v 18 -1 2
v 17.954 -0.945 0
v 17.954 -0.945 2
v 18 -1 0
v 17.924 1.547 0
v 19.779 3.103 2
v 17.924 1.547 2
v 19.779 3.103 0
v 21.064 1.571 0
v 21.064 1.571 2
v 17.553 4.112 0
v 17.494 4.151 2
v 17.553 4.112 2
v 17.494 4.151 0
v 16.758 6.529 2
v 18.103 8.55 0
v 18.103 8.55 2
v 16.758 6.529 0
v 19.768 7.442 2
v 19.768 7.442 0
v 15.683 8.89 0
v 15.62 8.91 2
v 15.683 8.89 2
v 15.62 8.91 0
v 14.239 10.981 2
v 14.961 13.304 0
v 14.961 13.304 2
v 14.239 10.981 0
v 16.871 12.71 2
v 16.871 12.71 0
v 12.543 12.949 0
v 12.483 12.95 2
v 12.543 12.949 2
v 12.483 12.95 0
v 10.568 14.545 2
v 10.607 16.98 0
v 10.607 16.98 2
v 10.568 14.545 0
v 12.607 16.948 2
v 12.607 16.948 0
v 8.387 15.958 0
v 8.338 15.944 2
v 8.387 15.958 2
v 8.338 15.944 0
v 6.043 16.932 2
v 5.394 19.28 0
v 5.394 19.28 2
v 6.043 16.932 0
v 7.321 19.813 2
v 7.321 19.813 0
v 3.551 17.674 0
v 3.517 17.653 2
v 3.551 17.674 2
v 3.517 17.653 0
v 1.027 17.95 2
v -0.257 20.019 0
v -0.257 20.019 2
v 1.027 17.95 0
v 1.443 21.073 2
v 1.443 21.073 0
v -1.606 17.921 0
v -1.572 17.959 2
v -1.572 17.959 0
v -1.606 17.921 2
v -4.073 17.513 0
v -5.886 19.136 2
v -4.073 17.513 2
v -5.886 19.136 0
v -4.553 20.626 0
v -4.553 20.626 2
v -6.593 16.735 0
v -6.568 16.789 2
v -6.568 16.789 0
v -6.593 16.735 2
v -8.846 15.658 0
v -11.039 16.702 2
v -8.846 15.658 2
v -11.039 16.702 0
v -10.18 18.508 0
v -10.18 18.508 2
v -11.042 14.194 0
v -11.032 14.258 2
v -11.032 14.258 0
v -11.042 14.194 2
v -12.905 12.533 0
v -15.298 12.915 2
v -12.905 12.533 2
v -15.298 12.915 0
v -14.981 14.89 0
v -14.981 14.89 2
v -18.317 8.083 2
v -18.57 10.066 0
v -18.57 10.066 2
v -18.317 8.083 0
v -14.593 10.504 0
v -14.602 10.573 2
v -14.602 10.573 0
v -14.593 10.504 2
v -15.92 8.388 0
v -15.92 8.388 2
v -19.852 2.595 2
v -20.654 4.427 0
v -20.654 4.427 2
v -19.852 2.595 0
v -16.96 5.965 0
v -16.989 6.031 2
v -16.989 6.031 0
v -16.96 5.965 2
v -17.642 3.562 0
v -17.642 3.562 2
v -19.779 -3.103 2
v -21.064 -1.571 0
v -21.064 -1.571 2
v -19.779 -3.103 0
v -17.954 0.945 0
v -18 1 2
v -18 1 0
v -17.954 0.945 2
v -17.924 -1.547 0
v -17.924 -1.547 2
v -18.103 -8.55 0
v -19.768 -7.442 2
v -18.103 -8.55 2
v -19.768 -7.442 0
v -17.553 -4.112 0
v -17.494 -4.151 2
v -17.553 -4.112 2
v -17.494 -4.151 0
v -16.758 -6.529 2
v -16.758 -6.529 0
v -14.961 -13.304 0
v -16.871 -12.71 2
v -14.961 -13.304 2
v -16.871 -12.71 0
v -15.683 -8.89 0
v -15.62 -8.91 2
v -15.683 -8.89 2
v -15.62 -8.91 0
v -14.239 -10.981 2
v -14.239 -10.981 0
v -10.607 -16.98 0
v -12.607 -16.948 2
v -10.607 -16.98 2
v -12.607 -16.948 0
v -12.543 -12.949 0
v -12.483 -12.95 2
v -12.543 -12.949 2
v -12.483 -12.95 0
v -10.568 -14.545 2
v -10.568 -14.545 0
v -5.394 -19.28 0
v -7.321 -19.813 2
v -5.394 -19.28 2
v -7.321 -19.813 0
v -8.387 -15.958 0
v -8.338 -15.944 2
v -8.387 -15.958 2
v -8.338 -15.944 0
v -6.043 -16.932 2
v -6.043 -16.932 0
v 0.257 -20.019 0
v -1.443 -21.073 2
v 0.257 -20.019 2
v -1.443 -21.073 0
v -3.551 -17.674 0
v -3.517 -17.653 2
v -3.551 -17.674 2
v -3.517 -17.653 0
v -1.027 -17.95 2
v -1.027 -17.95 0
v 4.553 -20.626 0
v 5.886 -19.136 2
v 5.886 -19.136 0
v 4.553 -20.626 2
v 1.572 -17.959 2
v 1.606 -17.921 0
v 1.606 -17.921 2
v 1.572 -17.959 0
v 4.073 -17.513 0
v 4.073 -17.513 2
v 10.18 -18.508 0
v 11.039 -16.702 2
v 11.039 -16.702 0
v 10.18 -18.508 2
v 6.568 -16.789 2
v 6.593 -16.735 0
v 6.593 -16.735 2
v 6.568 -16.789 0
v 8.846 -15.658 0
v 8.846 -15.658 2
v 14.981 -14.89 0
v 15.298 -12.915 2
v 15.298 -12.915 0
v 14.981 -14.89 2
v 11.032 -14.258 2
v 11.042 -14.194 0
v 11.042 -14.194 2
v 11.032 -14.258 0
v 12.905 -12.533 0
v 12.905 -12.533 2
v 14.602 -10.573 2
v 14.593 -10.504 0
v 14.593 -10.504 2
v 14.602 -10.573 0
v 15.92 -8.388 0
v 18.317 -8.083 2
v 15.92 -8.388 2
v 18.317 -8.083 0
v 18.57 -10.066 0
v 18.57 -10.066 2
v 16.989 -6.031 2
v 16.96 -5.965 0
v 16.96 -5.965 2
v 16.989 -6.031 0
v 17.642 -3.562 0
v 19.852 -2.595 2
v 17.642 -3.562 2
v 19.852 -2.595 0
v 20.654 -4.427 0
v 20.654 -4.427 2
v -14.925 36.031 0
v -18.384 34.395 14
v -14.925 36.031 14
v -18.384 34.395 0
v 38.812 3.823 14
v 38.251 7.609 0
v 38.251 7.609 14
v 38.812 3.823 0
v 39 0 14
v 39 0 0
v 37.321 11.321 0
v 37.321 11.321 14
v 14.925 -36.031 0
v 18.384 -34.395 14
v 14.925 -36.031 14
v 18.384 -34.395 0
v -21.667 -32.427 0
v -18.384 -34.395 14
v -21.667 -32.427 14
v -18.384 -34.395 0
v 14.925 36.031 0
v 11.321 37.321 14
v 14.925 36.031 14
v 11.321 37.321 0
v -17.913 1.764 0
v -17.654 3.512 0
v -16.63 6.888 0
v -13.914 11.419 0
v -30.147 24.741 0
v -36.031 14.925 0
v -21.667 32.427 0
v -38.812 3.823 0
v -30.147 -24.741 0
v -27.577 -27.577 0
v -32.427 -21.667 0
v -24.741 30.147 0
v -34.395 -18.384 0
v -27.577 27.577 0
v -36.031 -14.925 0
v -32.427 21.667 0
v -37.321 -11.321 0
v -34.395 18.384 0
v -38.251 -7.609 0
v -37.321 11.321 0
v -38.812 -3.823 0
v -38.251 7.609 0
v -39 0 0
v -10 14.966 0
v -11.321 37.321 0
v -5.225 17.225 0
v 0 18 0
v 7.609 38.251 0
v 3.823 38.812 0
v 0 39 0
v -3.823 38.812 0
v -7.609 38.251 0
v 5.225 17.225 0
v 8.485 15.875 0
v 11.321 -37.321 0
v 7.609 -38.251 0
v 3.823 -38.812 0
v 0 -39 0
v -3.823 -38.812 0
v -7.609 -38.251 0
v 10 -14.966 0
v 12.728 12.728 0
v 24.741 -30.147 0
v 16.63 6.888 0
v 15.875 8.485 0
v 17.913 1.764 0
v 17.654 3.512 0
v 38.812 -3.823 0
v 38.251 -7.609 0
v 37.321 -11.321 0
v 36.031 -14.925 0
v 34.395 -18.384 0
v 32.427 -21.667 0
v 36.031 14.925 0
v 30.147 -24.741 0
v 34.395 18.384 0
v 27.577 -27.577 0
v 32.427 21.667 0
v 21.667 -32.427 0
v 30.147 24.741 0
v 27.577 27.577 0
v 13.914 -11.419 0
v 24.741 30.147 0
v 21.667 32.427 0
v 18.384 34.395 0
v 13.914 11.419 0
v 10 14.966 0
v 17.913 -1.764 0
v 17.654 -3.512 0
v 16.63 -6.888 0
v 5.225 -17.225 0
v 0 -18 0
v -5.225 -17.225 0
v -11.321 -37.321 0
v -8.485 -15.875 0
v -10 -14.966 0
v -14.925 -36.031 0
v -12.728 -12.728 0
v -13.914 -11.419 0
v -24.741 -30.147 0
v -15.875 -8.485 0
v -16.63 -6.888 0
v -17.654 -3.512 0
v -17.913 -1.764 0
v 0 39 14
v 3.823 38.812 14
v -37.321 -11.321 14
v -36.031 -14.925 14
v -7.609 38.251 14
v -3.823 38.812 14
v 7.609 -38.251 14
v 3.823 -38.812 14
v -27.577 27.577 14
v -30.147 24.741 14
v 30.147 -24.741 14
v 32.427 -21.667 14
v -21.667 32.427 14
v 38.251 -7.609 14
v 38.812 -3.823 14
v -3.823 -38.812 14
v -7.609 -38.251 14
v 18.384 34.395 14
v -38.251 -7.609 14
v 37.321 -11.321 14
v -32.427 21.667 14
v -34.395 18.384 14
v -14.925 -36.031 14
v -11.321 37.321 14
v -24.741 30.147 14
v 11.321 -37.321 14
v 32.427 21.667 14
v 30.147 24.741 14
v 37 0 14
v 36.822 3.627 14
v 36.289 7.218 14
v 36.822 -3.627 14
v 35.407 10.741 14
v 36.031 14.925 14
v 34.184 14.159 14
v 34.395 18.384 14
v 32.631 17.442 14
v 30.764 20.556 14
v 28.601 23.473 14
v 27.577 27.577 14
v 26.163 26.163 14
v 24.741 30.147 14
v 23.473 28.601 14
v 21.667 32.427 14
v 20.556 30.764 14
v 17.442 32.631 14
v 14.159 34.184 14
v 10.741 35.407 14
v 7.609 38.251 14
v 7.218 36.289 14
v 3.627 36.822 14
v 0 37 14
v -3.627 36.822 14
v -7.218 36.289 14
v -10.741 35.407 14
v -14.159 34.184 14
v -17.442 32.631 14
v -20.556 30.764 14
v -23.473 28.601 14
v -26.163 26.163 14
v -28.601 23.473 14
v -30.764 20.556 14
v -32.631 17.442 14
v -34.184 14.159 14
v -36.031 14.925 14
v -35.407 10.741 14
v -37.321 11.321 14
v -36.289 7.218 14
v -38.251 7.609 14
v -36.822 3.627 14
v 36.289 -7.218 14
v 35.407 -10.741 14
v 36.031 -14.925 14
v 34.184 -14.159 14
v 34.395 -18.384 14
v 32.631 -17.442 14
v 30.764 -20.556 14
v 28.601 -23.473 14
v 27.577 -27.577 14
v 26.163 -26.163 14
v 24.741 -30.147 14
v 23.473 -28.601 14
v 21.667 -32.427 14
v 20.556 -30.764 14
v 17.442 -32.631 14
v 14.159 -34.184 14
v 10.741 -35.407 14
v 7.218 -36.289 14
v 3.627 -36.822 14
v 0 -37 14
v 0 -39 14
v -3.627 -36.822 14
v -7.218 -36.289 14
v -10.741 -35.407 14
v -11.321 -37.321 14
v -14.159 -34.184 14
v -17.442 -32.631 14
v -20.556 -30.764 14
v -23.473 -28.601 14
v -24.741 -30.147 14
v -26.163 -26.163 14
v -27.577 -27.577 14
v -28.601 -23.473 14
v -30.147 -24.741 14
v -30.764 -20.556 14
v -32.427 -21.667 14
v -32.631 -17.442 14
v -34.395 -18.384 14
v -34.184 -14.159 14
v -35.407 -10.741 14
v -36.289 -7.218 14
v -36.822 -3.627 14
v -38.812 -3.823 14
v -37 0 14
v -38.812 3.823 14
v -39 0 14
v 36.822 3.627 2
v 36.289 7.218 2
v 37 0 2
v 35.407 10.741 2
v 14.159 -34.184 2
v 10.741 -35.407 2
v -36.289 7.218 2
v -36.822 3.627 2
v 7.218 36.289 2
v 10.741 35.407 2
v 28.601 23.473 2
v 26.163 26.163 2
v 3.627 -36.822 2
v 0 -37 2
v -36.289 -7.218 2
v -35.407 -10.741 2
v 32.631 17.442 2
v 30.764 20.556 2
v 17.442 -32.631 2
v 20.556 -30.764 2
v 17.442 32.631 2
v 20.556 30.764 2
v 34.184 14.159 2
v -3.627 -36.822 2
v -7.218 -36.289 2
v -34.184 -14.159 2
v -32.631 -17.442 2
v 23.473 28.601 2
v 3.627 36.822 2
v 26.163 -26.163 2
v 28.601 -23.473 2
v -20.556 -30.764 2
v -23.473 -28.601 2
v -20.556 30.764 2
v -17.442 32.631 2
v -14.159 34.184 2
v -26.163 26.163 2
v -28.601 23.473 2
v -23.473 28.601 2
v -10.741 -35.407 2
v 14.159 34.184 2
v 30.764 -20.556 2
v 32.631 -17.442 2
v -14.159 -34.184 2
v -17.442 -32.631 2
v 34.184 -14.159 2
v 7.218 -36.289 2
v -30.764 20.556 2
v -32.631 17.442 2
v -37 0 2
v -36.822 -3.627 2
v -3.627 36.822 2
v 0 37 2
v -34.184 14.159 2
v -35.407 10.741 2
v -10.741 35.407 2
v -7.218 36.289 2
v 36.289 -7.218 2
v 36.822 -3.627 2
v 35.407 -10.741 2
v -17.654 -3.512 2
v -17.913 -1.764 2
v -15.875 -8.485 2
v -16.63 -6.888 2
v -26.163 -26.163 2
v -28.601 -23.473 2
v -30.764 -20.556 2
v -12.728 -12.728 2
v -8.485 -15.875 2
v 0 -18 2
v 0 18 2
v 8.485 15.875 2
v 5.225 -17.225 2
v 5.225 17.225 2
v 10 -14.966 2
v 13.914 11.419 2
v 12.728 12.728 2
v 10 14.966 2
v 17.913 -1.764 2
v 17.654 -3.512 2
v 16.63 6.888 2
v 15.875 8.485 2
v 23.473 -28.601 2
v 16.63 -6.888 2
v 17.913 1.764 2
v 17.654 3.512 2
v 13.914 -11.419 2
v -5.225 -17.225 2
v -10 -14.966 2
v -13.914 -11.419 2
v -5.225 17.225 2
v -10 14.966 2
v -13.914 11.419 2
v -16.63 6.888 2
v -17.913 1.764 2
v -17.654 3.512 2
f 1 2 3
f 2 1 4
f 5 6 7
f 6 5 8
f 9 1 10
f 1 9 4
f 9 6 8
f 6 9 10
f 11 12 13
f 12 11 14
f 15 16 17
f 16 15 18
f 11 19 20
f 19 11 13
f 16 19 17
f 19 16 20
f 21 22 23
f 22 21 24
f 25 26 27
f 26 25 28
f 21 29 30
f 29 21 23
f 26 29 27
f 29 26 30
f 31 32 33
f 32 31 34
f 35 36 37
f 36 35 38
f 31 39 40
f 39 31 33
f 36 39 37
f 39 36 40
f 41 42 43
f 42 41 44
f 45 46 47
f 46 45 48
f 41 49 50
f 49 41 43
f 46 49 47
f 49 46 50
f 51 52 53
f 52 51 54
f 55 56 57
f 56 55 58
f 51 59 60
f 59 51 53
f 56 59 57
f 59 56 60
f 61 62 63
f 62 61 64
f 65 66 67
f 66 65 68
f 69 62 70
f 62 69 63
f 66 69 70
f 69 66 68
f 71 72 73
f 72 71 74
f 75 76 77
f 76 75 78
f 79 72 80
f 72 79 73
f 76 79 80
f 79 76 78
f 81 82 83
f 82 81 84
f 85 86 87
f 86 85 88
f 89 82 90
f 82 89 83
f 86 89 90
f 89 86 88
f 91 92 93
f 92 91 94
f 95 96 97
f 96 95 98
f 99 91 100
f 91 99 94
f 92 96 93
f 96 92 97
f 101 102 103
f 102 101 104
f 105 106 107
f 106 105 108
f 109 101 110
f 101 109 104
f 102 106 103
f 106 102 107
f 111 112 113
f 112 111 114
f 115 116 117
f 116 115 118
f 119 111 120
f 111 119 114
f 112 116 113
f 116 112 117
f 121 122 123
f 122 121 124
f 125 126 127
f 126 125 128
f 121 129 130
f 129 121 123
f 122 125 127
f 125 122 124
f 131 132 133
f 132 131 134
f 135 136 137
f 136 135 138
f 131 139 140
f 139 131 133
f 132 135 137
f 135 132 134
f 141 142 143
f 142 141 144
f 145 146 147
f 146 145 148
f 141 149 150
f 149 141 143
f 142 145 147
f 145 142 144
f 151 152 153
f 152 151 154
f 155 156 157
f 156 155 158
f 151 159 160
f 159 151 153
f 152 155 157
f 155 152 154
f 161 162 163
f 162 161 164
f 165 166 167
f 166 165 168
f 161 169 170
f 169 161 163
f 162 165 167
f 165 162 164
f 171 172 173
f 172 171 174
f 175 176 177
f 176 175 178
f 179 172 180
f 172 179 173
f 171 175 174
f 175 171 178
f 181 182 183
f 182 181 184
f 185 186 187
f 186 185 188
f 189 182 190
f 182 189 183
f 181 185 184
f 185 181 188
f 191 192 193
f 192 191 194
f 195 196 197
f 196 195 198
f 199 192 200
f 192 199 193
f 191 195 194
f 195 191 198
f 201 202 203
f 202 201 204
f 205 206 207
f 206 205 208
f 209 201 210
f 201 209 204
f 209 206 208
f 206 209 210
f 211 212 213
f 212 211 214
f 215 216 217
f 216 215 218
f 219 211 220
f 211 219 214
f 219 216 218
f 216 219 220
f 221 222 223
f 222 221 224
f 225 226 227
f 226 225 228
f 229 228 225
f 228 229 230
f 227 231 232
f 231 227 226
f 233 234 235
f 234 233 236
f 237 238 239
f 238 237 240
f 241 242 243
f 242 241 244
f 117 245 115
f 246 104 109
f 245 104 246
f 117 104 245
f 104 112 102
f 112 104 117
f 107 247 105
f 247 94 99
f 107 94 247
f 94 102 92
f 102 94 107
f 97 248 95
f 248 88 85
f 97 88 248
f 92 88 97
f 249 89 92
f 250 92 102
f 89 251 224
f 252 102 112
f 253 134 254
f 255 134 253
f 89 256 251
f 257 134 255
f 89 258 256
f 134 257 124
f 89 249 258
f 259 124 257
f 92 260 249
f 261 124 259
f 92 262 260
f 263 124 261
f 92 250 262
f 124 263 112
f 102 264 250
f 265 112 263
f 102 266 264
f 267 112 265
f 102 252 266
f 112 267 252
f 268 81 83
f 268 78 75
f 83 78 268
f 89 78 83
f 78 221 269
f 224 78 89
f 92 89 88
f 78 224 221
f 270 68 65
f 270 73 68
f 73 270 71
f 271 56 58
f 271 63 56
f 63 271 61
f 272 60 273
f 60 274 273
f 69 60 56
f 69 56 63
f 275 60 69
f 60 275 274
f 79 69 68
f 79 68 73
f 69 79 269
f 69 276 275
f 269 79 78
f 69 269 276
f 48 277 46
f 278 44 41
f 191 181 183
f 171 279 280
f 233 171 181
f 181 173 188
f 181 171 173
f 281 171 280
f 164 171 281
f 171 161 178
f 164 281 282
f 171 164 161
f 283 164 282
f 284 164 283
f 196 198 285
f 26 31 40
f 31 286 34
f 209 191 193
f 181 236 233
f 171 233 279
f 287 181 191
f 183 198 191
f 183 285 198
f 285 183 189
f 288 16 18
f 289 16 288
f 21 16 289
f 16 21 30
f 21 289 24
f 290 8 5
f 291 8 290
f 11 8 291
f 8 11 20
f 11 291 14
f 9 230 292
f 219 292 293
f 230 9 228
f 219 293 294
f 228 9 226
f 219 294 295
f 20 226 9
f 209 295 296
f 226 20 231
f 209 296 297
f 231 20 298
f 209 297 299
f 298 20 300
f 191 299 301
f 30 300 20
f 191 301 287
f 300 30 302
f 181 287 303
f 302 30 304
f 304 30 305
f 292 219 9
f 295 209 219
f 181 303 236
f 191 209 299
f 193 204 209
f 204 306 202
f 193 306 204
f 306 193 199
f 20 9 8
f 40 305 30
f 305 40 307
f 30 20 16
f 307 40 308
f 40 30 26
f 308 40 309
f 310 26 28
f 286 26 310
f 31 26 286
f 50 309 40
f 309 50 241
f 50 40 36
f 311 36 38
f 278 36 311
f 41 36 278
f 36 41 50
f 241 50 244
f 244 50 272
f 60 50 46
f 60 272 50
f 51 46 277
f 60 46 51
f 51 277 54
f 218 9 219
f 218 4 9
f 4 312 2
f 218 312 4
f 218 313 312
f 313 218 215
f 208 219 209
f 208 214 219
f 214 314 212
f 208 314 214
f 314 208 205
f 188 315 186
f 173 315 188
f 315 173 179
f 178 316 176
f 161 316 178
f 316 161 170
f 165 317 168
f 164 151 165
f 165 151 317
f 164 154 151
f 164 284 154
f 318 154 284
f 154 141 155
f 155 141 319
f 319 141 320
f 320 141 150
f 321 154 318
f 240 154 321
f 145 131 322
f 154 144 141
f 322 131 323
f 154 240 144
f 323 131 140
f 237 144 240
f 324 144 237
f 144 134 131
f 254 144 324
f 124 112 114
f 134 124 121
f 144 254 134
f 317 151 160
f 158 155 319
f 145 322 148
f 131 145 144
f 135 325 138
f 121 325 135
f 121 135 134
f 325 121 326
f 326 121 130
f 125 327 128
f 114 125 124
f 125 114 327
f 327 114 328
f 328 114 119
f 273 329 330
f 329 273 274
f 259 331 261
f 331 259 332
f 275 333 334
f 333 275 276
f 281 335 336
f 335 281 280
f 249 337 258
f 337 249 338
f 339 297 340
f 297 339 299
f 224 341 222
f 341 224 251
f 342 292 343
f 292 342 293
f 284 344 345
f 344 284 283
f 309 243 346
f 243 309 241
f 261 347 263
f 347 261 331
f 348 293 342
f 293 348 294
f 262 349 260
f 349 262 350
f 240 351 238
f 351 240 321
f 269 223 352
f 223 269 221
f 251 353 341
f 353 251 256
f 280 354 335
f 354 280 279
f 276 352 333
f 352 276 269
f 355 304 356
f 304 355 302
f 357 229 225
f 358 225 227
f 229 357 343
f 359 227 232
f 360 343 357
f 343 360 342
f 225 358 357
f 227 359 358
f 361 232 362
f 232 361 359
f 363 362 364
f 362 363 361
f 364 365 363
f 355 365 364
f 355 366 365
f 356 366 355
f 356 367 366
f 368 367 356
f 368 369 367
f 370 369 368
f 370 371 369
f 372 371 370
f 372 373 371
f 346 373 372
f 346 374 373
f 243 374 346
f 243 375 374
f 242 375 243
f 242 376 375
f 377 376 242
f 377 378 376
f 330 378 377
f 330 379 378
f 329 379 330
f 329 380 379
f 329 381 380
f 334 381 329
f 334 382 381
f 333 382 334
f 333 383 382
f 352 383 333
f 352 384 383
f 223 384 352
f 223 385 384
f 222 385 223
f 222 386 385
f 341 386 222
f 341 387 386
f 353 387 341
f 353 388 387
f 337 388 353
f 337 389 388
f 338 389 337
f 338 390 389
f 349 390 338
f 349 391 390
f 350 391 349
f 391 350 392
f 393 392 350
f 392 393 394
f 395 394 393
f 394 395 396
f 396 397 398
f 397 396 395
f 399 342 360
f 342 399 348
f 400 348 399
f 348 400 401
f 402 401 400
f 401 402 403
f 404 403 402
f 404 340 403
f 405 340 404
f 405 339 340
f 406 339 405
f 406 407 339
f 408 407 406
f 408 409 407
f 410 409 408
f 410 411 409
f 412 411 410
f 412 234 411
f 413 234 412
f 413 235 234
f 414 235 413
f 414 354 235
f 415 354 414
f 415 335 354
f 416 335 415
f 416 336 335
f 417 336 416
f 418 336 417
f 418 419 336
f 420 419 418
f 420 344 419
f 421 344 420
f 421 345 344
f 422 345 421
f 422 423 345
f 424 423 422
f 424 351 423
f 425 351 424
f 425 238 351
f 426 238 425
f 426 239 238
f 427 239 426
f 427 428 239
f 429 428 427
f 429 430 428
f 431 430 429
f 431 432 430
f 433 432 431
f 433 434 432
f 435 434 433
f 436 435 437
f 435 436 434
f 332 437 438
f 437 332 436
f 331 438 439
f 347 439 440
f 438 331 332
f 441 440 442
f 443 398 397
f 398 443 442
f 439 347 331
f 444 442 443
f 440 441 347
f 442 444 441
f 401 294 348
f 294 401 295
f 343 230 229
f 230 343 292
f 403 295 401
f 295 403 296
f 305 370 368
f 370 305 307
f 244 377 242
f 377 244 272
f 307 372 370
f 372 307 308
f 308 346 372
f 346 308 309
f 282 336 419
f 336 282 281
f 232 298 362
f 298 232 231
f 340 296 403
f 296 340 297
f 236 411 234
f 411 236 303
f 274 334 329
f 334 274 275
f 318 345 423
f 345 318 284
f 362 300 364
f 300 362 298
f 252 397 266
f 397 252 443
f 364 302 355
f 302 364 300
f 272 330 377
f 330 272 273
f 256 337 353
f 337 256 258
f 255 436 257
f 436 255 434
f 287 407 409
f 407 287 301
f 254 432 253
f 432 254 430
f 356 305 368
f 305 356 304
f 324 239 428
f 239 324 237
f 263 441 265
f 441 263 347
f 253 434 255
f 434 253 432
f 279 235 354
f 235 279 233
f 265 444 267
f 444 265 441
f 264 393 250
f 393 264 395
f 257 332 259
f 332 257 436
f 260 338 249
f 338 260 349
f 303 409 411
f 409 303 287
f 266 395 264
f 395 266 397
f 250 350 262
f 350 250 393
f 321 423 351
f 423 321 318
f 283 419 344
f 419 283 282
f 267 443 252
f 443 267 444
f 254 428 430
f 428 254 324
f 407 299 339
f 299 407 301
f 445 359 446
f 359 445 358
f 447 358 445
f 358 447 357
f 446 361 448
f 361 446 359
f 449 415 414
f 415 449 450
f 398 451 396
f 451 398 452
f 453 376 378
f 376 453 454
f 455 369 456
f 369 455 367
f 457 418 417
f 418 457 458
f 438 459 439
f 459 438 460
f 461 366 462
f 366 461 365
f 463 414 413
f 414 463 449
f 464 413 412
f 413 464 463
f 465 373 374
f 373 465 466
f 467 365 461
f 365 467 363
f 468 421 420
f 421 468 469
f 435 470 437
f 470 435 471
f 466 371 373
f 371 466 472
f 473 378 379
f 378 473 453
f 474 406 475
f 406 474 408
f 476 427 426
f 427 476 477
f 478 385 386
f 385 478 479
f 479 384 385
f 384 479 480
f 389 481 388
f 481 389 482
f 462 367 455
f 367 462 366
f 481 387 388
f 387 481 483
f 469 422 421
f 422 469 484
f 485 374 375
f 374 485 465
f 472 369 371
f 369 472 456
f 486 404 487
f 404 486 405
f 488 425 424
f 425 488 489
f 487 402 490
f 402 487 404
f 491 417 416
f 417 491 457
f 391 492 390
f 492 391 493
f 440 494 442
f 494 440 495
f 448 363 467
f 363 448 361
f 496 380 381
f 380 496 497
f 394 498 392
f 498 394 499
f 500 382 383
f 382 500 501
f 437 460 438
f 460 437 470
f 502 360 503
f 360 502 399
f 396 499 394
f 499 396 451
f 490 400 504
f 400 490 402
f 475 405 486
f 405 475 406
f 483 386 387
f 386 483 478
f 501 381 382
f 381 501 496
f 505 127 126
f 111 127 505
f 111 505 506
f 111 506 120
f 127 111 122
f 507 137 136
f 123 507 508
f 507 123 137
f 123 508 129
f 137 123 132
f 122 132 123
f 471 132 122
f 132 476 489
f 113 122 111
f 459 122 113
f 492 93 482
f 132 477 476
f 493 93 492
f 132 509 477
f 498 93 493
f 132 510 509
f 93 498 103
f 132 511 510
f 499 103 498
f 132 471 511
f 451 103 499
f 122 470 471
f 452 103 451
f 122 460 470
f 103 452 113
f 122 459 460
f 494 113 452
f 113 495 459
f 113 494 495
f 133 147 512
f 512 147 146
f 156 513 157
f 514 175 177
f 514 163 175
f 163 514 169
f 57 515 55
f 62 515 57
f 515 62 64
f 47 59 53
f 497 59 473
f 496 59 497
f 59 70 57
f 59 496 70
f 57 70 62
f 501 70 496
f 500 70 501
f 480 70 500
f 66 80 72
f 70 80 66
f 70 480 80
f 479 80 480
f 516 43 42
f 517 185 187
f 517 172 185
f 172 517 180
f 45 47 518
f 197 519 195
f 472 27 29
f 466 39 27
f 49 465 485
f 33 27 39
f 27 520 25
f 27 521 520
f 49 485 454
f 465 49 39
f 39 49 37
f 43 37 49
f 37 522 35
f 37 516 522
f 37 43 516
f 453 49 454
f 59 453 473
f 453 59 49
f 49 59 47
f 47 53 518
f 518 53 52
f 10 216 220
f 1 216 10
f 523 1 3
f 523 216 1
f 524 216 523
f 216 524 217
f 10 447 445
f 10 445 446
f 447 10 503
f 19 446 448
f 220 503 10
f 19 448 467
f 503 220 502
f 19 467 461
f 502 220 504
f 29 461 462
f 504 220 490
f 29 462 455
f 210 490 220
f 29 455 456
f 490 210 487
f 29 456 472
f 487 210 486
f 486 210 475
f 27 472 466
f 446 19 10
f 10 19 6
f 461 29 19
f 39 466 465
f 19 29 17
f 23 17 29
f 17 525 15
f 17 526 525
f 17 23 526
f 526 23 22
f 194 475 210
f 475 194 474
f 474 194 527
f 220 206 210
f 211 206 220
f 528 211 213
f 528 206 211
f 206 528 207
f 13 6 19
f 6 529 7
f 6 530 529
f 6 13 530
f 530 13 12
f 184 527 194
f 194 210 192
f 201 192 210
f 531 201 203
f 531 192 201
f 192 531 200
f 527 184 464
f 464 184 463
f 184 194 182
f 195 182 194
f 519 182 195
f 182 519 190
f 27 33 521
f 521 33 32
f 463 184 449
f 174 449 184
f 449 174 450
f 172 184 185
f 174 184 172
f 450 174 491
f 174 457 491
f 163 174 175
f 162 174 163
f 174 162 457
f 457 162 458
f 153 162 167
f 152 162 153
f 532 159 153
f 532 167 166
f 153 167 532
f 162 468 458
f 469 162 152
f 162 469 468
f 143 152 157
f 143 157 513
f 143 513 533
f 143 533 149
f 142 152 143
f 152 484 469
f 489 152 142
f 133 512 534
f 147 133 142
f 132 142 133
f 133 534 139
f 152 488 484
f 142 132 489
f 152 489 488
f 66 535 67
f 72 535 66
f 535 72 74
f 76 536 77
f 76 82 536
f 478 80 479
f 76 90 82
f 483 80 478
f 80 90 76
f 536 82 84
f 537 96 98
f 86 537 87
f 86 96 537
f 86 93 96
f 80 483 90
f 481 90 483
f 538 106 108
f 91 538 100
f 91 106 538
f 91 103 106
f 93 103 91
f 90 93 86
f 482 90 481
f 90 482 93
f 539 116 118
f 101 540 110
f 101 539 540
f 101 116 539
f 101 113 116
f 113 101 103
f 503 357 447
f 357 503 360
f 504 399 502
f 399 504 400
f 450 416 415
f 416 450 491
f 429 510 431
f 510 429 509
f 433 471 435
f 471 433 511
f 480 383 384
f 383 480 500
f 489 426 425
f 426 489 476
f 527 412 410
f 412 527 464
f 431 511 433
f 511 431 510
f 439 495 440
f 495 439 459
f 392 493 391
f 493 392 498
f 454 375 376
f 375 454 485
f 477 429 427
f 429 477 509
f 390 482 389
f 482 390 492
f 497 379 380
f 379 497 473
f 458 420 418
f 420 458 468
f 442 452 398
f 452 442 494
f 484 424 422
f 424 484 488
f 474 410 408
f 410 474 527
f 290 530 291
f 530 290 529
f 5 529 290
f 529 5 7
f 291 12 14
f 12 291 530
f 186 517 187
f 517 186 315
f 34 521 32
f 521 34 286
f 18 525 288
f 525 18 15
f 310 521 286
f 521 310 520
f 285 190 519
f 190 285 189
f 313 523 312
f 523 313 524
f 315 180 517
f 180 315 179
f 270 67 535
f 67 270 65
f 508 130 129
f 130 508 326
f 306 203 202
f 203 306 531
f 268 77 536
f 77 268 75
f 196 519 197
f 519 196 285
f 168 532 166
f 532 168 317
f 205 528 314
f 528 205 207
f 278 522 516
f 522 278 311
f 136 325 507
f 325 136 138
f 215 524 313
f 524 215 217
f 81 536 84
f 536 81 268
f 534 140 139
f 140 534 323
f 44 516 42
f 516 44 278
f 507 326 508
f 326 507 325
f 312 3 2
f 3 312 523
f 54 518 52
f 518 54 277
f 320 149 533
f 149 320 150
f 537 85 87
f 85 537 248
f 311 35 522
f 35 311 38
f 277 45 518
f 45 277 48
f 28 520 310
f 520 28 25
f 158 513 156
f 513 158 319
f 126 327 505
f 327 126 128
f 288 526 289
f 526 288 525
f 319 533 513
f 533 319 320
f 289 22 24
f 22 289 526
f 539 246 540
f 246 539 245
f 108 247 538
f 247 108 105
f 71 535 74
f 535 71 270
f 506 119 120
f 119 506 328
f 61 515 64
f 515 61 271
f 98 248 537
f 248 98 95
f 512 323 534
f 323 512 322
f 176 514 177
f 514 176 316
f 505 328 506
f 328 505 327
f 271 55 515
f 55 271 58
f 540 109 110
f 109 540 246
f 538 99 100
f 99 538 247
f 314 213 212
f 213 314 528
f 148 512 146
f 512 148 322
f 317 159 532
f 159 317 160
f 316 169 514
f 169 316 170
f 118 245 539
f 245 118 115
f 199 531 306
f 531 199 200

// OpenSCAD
$fn=64;
loupe_d=79;
loupe_h=15;
wall=2;
m=36;//[36,23]
part="adapter";//[adapter,holder]

module loupe_negative(d) {
  cylinder(h=loupe_h,d=d);
  translate([0,-d/2,0])cube([d,d,loupe_h]);
}

if (part=="holder") difference() {
  cylinder(d=loupe_d+2*wall,h=2*loupe_h+2*wall);
  loupe_negative(loupe_d);
  translate([0,0,loupe_h])loupe_negative(loupe_d-2*wall);
  translate([0,0,loupe_h+wall])loupe_negative(loupe_d);
  translate([0,0,2*loupe_h+wall])loupe_negative(loupe_d-2*wall);
}

if (part=="adapter") {
  difference() {
    cylinder(d=loupe_d-1,h=loupe_h-1);
    translate([0,0,wall])cylinder(h=loupe_h,d=loupe_d-1-2*wall);
    translate([0,0,-wall/2])cylinder(d=m,h=wall*2);
    for (a=[0:360/22:360]) rotate([0,0,a]) translate([m/2,-1,-wall/2]) rotate([0,0,40]) cube([4,2,2*wall]);
  }
}
